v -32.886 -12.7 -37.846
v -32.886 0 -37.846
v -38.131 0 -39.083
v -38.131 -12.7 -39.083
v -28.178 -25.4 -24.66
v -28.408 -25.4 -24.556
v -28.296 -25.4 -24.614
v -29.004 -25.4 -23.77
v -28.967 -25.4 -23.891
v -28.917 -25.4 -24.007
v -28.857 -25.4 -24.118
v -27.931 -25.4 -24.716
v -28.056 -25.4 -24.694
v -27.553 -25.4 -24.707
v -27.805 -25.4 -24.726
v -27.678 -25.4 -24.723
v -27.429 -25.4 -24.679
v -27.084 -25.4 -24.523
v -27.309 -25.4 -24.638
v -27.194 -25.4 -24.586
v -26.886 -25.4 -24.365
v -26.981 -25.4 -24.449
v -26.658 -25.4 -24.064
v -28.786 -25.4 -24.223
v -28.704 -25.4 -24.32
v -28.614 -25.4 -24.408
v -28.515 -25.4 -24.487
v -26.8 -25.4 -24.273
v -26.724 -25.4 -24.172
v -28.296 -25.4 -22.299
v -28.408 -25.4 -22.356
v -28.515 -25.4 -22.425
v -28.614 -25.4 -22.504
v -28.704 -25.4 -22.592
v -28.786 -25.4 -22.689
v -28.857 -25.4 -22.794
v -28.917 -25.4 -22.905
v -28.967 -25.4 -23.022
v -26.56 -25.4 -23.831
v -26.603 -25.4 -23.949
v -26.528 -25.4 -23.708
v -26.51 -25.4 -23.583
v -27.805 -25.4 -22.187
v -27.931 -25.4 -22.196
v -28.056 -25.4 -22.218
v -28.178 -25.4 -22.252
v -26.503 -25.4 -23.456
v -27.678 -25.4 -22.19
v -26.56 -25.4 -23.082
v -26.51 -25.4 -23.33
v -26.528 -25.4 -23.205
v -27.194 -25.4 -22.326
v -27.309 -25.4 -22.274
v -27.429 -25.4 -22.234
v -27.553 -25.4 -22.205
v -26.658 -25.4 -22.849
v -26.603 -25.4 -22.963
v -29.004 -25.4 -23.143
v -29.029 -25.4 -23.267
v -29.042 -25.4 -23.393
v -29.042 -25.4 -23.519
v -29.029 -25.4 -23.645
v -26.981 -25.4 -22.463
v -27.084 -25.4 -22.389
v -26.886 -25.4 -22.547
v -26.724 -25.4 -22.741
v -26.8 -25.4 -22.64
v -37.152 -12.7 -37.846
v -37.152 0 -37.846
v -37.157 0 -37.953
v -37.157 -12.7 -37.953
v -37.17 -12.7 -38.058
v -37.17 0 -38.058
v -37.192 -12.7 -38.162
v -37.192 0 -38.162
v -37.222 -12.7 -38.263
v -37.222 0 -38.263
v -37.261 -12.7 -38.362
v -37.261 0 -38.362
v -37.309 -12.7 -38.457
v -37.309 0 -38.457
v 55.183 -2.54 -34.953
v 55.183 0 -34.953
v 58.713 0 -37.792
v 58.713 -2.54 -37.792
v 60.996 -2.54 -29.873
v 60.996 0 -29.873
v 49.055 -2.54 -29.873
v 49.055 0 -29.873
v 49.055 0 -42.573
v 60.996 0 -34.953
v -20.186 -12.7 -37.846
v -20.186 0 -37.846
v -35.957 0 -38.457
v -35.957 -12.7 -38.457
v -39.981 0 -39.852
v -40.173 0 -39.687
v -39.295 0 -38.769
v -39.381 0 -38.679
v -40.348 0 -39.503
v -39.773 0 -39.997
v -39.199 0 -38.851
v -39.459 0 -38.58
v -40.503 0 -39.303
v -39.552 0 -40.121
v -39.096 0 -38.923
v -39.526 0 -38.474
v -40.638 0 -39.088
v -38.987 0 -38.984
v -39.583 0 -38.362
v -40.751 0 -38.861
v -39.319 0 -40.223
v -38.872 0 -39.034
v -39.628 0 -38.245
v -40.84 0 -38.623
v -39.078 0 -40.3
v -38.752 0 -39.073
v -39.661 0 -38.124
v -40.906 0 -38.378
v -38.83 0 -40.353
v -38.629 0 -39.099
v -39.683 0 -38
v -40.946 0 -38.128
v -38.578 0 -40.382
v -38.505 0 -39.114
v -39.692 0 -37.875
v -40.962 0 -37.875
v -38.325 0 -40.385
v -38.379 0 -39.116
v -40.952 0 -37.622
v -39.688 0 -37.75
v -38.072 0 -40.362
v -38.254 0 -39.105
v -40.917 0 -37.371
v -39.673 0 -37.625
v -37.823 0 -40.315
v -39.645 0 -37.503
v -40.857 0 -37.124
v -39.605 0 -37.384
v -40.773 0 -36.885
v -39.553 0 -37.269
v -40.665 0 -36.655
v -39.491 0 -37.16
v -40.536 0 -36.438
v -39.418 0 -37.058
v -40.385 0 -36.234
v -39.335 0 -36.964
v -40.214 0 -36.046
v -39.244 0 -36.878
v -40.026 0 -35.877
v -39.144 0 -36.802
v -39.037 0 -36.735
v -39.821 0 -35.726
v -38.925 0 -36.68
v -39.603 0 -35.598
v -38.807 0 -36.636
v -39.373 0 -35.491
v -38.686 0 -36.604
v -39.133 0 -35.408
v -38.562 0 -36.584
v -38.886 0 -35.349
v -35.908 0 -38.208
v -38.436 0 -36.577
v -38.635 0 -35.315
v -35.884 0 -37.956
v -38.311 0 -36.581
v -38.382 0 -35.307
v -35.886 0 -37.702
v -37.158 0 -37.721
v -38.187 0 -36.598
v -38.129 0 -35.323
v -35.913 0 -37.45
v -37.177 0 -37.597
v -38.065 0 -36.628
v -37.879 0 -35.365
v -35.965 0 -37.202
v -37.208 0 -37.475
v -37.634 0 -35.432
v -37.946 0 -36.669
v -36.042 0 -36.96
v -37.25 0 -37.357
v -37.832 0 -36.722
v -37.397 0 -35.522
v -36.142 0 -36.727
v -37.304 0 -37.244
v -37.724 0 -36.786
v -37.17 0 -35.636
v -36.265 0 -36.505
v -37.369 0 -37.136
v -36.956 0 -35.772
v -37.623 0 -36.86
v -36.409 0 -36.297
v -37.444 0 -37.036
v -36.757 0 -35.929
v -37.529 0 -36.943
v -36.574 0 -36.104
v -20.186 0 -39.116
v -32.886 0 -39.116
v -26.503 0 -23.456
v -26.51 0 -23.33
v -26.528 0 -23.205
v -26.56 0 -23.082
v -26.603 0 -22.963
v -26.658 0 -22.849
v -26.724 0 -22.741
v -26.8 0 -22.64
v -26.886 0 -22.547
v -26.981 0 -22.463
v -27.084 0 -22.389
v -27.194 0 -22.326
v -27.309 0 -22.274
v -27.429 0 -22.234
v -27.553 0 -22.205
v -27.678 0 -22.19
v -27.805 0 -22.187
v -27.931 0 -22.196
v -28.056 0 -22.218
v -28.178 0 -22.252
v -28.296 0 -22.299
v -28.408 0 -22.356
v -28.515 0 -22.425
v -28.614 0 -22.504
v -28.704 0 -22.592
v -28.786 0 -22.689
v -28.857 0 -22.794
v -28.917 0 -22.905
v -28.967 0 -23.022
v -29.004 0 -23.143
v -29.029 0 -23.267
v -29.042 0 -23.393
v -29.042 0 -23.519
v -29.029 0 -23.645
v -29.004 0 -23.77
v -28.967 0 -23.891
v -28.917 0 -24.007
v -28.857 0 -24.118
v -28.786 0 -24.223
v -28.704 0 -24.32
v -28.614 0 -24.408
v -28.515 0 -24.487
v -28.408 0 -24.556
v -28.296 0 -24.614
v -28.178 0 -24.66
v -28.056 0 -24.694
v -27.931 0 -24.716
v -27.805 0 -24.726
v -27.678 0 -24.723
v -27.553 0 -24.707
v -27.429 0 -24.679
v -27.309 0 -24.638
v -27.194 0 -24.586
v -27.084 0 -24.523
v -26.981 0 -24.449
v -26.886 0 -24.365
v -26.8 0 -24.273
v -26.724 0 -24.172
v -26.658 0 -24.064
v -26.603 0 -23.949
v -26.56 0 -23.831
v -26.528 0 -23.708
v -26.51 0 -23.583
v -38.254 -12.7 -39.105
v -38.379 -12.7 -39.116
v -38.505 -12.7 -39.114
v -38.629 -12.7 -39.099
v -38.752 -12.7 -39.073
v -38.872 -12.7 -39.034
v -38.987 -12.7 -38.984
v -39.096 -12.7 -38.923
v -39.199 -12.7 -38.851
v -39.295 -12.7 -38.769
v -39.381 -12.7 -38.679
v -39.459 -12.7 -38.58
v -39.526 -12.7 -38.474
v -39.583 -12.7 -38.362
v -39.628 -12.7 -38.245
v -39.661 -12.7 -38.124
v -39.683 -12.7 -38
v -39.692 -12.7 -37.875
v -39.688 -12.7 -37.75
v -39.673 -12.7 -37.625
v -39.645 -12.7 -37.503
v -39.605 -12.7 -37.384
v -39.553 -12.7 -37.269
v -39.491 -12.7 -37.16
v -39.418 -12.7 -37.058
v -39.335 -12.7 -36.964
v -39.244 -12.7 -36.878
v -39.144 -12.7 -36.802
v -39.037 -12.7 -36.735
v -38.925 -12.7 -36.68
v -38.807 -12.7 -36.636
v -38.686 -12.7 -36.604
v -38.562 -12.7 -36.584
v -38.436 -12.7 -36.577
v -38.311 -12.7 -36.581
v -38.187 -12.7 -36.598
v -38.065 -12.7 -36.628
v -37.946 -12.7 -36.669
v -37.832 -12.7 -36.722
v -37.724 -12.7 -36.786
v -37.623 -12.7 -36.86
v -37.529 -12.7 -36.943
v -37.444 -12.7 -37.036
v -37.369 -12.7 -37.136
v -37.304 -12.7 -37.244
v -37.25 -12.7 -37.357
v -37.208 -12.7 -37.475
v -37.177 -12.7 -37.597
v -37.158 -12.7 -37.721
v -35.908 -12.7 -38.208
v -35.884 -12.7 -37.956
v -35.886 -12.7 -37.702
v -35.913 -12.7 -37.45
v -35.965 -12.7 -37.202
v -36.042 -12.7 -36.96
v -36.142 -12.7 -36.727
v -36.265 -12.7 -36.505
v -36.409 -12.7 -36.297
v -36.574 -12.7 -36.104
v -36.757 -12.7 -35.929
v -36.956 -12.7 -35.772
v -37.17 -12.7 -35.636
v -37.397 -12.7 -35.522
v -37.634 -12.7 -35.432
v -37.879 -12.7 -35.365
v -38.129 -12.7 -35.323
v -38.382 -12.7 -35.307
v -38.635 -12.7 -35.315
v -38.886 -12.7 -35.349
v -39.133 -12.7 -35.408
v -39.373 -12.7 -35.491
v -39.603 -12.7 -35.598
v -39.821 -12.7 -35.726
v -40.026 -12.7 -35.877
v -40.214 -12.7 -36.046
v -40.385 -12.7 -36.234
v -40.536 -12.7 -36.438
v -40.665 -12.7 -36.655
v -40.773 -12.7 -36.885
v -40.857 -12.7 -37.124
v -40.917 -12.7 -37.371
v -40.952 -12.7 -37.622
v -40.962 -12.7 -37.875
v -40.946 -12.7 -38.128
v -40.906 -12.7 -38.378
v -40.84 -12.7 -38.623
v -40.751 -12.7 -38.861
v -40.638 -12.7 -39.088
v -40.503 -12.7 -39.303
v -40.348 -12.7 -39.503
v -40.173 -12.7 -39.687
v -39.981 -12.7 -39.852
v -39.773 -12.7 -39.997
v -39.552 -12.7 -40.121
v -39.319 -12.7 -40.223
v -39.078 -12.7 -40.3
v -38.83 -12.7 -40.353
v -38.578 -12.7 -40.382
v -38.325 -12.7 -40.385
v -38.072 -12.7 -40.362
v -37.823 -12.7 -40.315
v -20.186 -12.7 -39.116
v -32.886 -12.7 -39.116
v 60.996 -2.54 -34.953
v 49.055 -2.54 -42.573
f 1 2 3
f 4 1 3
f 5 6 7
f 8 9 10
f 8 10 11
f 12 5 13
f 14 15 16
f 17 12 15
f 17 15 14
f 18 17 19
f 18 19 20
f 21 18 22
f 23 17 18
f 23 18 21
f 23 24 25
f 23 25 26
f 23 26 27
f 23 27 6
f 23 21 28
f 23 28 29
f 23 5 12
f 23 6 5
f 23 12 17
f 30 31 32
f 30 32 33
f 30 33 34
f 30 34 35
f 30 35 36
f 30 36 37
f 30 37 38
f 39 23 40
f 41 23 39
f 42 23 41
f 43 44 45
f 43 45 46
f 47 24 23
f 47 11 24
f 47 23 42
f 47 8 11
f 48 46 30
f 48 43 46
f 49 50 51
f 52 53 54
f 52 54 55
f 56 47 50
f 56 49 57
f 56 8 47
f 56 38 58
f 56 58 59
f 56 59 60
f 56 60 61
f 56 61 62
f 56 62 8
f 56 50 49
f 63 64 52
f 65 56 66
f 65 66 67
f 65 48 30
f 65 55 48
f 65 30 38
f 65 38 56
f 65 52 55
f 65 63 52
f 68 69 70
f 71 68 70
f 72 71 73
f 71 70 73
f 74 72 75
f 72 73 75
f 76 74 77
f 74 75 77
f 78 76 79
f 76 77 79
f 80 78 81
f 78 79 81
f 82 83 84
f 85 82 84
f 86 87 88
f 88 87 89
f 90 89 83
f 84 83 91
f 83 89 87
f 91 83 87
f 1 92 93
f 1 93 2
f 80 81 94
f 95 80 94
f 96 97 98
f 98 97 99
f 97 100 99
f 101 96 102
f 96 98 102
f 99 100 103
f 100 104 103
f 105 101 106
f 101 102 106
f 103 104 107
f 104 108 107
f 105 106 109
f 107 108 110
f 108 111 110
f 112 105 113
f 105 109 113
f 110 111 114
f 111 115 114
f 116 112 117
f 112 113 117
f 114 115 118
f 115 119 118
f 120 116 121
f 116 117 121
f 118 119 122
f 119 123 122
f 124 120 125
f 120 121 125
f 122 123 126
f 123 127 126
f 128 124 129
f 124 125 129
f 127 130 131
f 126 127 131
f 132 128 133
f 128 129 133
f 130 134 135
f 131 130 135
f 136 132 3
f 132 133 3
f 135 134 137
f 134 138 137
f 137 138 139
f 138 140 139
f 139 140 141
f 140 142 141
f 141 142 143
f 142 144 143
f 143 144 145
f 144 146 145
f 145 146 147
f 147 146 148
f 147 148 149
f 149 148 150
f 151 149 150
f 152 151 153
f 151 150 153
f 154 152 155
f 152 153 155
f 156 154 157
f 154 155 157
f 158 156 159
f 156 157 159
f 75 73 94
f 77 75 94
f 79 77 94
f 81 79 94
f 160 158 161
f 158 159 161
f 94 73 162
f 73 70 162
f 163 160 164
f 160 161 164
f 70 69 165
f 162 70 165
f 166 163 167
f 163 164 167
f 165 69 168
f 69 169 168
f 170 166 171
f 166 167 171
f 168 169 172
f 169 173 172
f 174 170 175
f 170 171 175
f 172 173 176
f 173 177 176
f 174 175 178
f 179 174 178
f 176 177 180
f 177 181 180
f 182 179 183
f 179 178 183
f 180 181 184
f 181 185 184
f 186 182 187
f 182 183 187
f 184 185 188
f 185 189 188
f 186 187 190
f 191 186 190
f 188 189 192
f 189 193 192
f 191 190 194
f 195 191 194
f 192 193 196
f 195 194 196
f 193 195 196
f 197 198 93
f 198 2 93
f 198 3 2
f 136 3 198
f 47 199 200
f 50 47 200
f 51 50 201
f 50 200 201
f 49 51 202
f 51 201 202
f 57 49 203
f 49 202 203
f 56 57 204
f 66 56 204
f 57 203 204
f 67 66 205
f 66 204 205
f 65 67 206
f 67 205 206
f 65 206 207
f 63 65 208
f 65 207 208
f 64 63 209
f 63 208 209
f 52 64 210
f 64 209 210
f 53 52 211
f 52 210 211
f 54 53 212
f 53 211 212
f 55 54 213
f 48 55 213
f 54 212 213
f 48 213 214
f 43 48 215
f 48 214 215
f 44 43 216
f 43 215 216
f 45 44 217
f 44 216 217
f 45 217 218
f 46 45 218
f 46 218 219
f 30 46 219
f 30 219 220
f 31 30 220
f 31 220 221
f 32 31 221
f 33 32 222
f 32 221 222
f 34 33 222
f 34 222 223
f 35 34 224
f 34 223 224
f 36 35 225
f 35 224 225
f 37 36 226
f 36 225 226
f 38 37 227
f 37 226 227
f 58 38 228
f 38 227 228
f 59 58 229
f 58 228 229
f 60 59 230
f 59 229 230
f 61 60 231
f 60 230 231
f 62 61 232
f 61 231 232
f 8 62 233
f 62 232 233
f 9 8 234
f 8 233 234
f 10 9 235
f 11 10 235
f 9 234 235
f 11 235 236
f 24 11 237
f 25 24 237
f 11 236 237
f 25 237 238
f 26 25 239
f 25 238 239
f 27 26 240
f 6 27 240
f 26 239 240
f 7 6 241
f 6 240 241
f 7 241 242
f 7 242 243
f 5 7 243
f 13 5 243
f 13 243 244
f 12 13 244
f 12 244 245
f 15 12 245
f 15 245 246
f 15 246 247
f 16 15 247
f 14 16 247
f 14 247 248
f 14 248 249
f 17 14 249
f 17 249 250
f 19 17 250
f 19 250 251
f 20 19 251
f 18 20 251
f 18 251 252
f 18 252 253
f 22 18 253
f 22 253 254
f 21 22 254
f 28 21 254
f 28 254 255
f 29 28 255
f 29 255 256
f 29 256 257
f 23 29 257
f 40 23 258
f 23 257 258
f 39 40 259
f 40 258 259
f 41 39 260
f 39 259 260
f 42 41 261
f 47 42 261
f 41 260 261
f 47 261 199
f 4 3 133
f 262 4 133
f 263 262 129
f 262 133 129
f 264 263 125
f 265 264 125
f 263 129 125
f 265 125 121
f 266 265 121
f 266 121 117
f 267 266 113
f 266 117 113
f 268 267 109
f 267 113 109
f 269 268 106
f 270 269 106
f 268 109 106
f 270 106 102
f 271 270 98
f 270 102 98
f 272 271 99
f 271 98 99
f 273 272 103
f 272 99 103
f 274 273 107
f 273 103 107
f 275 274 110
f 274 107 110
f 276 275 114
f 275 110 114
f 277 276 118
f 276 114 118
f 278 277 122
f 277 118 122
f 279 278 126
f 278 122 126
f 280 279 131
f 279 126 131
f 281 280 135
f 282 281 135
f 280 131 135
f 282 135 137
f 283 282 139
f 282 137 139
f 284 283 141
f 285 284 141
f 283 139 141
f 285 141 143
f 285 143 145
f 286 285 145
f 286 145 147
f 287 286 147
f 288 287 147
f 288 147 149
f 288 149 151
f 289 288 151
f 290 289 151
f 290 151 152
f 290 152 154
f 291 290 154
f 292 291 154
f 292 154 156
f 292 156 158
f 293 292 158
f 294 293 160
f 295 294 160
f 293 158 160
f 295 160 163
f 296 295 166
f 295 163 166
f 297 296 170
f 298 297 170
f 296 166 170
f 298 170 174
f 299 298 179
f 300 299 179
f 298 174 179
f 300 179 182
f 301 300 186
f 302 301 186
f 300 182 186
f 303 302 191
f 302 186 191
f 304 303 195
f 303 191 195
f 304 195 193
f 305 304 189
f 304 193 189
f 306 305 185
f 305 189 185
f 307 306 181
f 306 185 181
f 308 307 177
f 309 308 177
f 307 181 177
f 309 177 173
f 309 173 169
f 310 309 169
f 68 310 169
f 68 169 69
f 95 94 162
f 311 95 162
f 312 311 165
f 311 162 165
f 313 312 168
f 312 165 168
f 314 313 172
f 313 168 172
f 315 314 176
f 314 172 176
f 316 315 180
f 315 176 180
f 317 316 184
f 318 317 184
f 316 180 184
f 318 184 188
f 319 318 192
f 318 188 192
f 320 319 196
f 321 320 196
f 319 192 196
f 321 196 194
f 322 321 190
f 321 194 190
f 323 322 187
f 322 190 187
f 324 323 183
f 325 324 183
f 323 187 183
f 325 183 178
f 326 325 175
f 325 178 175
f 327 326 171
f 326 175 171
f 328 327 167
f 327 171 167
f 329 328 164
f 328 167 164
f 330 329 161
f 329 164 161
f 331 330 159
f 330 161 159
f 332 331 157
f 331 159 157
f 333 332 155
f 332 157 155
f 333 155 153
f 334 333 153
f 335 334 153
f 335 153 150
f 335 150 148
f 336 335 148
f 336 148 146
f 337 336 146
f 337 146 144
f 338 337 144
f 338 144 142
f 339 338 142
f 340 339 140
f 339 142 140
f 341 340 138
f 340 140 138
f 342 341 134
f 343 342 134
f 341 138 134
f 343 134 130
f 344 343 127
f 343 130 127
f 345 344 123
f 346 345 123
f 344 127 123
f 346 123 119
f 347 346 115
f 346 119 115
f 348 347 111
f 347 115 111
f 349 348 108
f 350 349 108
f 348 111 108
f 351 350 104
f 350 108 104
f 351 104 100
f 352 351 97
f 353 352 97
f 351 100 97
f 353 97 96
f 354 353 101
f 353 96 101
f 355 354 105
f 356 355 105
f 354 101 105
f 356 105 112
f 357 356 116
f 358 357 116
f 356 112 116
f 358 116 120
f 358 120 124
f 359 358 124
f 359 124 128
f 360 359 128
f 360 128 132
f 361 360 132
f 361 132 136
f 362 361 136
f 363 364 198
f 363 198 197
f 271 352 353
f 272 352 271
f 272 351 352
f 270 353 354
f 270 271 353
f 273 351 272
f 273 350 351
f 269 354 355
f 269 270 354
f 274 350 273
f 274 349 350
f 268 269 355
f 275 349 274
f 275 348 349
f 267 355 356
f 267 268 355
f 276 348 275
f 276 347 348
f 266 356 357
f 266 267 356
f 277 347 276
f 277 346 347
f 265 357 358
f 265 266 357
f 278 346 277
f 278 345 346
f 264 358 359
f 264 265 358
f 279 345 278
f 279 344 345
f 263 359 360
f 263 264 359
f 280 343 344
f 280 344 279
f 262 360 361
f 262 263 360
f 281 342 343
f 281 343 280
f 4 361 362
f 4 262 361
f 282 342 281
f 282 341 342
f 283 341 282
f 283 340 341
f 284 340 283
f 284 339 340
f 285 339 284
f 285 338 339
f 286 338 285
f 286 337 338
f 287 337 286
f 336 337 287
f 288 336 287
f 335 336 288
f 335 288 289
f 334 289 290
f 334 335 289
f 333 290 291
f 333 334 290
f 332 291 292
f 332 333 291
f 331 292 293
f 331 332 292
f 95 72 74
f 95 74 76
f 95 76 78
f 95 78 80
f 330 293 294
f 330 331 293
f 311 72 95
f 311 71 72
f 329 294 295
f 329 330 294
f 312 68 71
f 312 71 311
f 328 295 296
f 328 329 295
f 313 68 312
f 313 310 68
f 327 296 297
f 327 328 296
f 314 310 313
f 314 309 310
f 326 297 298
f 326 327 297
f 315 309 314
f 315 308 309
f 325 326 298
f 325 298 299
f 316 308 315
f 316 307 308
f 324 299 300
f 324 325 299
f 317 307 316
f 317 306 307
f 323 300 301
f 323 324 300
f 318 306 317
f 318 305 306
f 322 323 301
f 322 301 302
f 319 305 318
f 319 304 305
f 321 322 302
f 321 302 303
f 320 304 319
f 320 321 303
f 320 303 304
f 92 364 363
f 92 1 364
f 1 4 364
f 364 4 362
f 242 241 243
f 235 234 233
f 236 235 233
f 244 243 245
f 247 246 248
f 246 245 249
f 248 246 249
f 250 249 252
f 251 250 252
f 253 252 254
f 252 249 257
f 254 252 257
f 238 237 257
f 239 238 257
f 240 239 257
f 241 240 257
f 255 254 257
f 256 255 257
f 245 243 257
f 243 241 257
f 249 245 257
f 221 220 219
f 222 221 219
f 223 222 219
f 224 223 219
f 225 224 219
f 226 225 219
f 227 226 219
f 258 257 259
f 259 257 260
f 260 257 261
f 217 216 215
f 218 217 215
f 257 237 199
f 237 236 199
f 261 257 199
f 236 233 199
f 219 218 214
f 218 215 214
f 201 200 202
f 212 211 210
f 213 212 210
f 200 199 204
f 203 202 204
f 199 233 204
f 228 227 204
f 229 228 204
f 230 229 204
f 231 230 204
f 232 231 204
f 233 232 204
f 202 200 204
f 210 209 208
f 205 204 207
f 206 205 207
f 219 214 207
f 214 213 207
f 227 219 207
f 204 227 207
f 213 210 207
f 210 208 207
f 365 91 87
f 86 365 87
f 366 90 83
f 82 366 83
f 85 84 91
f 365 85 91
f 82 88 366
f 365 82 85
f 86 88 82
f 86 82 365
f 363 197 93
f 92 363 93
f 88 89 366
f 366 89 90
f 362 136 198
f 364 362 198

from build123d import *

# Parameters (mm, degrees)
F1_DEPTH = 12.7
F3_DEPTH = 2.54
F4_R     = 1.27
F5_DEPTH = 25.4


with BuildPart() as f1:
    # F0 (on Front) → F1 (new body)
    with BuildSketch(Plane.XZ):
        with BuildLine():
            ThreePointArc((-38.130712, -39.082584), (-39.417792, -37.058144), (-37.15207, -37.846457))
            ThreePointArc((-37.15207, -37.846457), (-37.191801, -38.161634), (-37.308506, -38.457091))
            Line((-37.308506, -38.457091), (-35.956563, -38.457091))
            ThreePointArc((-35.956563, -38.457091), (-40.21394, -36.046234), (-37.82291, -40.314778))
            Line((-37.82291, -40.314778), (-32.886269, -39.116457))
            Line((-32.886269, -39.116457), (-20.186269, -39.116457))
            Line((-20.186269, -39.116457), (-20.186269, -37.846457))
            Line((-20.186269, -37.846457), (-32.886269, -37.846457))
            Line((-32.886269, -37.846457), (-38.130712, -39.082584))
        make_face()
    extrude(amount=F1_DEPTH)


with BuildPart() as f3:
    # F2 (on Front) → F3 (new body)
    with BuildSketch(Plane.XZ):
        Polygon((60.995936, -34.952635), (60.995936, -29.872635), (49.054779, -29.872635), (49.054779, -42.572635), (55.182708, -34.952635), (58.71289, -37.791572), align=None)
    extrude(amount=F3_DEPTH)


with BuildPart() as f5:
    # F4 (on Front) → F5 (new body)
    with BuildSketch(Plane.XZ):
        with Locations((-27.773255, -23.456169)):
            Circle(F4_R)
    extrude(amount=F5_DEPTH)


solid = Compound([f1.part, f3.part, f5.part])
